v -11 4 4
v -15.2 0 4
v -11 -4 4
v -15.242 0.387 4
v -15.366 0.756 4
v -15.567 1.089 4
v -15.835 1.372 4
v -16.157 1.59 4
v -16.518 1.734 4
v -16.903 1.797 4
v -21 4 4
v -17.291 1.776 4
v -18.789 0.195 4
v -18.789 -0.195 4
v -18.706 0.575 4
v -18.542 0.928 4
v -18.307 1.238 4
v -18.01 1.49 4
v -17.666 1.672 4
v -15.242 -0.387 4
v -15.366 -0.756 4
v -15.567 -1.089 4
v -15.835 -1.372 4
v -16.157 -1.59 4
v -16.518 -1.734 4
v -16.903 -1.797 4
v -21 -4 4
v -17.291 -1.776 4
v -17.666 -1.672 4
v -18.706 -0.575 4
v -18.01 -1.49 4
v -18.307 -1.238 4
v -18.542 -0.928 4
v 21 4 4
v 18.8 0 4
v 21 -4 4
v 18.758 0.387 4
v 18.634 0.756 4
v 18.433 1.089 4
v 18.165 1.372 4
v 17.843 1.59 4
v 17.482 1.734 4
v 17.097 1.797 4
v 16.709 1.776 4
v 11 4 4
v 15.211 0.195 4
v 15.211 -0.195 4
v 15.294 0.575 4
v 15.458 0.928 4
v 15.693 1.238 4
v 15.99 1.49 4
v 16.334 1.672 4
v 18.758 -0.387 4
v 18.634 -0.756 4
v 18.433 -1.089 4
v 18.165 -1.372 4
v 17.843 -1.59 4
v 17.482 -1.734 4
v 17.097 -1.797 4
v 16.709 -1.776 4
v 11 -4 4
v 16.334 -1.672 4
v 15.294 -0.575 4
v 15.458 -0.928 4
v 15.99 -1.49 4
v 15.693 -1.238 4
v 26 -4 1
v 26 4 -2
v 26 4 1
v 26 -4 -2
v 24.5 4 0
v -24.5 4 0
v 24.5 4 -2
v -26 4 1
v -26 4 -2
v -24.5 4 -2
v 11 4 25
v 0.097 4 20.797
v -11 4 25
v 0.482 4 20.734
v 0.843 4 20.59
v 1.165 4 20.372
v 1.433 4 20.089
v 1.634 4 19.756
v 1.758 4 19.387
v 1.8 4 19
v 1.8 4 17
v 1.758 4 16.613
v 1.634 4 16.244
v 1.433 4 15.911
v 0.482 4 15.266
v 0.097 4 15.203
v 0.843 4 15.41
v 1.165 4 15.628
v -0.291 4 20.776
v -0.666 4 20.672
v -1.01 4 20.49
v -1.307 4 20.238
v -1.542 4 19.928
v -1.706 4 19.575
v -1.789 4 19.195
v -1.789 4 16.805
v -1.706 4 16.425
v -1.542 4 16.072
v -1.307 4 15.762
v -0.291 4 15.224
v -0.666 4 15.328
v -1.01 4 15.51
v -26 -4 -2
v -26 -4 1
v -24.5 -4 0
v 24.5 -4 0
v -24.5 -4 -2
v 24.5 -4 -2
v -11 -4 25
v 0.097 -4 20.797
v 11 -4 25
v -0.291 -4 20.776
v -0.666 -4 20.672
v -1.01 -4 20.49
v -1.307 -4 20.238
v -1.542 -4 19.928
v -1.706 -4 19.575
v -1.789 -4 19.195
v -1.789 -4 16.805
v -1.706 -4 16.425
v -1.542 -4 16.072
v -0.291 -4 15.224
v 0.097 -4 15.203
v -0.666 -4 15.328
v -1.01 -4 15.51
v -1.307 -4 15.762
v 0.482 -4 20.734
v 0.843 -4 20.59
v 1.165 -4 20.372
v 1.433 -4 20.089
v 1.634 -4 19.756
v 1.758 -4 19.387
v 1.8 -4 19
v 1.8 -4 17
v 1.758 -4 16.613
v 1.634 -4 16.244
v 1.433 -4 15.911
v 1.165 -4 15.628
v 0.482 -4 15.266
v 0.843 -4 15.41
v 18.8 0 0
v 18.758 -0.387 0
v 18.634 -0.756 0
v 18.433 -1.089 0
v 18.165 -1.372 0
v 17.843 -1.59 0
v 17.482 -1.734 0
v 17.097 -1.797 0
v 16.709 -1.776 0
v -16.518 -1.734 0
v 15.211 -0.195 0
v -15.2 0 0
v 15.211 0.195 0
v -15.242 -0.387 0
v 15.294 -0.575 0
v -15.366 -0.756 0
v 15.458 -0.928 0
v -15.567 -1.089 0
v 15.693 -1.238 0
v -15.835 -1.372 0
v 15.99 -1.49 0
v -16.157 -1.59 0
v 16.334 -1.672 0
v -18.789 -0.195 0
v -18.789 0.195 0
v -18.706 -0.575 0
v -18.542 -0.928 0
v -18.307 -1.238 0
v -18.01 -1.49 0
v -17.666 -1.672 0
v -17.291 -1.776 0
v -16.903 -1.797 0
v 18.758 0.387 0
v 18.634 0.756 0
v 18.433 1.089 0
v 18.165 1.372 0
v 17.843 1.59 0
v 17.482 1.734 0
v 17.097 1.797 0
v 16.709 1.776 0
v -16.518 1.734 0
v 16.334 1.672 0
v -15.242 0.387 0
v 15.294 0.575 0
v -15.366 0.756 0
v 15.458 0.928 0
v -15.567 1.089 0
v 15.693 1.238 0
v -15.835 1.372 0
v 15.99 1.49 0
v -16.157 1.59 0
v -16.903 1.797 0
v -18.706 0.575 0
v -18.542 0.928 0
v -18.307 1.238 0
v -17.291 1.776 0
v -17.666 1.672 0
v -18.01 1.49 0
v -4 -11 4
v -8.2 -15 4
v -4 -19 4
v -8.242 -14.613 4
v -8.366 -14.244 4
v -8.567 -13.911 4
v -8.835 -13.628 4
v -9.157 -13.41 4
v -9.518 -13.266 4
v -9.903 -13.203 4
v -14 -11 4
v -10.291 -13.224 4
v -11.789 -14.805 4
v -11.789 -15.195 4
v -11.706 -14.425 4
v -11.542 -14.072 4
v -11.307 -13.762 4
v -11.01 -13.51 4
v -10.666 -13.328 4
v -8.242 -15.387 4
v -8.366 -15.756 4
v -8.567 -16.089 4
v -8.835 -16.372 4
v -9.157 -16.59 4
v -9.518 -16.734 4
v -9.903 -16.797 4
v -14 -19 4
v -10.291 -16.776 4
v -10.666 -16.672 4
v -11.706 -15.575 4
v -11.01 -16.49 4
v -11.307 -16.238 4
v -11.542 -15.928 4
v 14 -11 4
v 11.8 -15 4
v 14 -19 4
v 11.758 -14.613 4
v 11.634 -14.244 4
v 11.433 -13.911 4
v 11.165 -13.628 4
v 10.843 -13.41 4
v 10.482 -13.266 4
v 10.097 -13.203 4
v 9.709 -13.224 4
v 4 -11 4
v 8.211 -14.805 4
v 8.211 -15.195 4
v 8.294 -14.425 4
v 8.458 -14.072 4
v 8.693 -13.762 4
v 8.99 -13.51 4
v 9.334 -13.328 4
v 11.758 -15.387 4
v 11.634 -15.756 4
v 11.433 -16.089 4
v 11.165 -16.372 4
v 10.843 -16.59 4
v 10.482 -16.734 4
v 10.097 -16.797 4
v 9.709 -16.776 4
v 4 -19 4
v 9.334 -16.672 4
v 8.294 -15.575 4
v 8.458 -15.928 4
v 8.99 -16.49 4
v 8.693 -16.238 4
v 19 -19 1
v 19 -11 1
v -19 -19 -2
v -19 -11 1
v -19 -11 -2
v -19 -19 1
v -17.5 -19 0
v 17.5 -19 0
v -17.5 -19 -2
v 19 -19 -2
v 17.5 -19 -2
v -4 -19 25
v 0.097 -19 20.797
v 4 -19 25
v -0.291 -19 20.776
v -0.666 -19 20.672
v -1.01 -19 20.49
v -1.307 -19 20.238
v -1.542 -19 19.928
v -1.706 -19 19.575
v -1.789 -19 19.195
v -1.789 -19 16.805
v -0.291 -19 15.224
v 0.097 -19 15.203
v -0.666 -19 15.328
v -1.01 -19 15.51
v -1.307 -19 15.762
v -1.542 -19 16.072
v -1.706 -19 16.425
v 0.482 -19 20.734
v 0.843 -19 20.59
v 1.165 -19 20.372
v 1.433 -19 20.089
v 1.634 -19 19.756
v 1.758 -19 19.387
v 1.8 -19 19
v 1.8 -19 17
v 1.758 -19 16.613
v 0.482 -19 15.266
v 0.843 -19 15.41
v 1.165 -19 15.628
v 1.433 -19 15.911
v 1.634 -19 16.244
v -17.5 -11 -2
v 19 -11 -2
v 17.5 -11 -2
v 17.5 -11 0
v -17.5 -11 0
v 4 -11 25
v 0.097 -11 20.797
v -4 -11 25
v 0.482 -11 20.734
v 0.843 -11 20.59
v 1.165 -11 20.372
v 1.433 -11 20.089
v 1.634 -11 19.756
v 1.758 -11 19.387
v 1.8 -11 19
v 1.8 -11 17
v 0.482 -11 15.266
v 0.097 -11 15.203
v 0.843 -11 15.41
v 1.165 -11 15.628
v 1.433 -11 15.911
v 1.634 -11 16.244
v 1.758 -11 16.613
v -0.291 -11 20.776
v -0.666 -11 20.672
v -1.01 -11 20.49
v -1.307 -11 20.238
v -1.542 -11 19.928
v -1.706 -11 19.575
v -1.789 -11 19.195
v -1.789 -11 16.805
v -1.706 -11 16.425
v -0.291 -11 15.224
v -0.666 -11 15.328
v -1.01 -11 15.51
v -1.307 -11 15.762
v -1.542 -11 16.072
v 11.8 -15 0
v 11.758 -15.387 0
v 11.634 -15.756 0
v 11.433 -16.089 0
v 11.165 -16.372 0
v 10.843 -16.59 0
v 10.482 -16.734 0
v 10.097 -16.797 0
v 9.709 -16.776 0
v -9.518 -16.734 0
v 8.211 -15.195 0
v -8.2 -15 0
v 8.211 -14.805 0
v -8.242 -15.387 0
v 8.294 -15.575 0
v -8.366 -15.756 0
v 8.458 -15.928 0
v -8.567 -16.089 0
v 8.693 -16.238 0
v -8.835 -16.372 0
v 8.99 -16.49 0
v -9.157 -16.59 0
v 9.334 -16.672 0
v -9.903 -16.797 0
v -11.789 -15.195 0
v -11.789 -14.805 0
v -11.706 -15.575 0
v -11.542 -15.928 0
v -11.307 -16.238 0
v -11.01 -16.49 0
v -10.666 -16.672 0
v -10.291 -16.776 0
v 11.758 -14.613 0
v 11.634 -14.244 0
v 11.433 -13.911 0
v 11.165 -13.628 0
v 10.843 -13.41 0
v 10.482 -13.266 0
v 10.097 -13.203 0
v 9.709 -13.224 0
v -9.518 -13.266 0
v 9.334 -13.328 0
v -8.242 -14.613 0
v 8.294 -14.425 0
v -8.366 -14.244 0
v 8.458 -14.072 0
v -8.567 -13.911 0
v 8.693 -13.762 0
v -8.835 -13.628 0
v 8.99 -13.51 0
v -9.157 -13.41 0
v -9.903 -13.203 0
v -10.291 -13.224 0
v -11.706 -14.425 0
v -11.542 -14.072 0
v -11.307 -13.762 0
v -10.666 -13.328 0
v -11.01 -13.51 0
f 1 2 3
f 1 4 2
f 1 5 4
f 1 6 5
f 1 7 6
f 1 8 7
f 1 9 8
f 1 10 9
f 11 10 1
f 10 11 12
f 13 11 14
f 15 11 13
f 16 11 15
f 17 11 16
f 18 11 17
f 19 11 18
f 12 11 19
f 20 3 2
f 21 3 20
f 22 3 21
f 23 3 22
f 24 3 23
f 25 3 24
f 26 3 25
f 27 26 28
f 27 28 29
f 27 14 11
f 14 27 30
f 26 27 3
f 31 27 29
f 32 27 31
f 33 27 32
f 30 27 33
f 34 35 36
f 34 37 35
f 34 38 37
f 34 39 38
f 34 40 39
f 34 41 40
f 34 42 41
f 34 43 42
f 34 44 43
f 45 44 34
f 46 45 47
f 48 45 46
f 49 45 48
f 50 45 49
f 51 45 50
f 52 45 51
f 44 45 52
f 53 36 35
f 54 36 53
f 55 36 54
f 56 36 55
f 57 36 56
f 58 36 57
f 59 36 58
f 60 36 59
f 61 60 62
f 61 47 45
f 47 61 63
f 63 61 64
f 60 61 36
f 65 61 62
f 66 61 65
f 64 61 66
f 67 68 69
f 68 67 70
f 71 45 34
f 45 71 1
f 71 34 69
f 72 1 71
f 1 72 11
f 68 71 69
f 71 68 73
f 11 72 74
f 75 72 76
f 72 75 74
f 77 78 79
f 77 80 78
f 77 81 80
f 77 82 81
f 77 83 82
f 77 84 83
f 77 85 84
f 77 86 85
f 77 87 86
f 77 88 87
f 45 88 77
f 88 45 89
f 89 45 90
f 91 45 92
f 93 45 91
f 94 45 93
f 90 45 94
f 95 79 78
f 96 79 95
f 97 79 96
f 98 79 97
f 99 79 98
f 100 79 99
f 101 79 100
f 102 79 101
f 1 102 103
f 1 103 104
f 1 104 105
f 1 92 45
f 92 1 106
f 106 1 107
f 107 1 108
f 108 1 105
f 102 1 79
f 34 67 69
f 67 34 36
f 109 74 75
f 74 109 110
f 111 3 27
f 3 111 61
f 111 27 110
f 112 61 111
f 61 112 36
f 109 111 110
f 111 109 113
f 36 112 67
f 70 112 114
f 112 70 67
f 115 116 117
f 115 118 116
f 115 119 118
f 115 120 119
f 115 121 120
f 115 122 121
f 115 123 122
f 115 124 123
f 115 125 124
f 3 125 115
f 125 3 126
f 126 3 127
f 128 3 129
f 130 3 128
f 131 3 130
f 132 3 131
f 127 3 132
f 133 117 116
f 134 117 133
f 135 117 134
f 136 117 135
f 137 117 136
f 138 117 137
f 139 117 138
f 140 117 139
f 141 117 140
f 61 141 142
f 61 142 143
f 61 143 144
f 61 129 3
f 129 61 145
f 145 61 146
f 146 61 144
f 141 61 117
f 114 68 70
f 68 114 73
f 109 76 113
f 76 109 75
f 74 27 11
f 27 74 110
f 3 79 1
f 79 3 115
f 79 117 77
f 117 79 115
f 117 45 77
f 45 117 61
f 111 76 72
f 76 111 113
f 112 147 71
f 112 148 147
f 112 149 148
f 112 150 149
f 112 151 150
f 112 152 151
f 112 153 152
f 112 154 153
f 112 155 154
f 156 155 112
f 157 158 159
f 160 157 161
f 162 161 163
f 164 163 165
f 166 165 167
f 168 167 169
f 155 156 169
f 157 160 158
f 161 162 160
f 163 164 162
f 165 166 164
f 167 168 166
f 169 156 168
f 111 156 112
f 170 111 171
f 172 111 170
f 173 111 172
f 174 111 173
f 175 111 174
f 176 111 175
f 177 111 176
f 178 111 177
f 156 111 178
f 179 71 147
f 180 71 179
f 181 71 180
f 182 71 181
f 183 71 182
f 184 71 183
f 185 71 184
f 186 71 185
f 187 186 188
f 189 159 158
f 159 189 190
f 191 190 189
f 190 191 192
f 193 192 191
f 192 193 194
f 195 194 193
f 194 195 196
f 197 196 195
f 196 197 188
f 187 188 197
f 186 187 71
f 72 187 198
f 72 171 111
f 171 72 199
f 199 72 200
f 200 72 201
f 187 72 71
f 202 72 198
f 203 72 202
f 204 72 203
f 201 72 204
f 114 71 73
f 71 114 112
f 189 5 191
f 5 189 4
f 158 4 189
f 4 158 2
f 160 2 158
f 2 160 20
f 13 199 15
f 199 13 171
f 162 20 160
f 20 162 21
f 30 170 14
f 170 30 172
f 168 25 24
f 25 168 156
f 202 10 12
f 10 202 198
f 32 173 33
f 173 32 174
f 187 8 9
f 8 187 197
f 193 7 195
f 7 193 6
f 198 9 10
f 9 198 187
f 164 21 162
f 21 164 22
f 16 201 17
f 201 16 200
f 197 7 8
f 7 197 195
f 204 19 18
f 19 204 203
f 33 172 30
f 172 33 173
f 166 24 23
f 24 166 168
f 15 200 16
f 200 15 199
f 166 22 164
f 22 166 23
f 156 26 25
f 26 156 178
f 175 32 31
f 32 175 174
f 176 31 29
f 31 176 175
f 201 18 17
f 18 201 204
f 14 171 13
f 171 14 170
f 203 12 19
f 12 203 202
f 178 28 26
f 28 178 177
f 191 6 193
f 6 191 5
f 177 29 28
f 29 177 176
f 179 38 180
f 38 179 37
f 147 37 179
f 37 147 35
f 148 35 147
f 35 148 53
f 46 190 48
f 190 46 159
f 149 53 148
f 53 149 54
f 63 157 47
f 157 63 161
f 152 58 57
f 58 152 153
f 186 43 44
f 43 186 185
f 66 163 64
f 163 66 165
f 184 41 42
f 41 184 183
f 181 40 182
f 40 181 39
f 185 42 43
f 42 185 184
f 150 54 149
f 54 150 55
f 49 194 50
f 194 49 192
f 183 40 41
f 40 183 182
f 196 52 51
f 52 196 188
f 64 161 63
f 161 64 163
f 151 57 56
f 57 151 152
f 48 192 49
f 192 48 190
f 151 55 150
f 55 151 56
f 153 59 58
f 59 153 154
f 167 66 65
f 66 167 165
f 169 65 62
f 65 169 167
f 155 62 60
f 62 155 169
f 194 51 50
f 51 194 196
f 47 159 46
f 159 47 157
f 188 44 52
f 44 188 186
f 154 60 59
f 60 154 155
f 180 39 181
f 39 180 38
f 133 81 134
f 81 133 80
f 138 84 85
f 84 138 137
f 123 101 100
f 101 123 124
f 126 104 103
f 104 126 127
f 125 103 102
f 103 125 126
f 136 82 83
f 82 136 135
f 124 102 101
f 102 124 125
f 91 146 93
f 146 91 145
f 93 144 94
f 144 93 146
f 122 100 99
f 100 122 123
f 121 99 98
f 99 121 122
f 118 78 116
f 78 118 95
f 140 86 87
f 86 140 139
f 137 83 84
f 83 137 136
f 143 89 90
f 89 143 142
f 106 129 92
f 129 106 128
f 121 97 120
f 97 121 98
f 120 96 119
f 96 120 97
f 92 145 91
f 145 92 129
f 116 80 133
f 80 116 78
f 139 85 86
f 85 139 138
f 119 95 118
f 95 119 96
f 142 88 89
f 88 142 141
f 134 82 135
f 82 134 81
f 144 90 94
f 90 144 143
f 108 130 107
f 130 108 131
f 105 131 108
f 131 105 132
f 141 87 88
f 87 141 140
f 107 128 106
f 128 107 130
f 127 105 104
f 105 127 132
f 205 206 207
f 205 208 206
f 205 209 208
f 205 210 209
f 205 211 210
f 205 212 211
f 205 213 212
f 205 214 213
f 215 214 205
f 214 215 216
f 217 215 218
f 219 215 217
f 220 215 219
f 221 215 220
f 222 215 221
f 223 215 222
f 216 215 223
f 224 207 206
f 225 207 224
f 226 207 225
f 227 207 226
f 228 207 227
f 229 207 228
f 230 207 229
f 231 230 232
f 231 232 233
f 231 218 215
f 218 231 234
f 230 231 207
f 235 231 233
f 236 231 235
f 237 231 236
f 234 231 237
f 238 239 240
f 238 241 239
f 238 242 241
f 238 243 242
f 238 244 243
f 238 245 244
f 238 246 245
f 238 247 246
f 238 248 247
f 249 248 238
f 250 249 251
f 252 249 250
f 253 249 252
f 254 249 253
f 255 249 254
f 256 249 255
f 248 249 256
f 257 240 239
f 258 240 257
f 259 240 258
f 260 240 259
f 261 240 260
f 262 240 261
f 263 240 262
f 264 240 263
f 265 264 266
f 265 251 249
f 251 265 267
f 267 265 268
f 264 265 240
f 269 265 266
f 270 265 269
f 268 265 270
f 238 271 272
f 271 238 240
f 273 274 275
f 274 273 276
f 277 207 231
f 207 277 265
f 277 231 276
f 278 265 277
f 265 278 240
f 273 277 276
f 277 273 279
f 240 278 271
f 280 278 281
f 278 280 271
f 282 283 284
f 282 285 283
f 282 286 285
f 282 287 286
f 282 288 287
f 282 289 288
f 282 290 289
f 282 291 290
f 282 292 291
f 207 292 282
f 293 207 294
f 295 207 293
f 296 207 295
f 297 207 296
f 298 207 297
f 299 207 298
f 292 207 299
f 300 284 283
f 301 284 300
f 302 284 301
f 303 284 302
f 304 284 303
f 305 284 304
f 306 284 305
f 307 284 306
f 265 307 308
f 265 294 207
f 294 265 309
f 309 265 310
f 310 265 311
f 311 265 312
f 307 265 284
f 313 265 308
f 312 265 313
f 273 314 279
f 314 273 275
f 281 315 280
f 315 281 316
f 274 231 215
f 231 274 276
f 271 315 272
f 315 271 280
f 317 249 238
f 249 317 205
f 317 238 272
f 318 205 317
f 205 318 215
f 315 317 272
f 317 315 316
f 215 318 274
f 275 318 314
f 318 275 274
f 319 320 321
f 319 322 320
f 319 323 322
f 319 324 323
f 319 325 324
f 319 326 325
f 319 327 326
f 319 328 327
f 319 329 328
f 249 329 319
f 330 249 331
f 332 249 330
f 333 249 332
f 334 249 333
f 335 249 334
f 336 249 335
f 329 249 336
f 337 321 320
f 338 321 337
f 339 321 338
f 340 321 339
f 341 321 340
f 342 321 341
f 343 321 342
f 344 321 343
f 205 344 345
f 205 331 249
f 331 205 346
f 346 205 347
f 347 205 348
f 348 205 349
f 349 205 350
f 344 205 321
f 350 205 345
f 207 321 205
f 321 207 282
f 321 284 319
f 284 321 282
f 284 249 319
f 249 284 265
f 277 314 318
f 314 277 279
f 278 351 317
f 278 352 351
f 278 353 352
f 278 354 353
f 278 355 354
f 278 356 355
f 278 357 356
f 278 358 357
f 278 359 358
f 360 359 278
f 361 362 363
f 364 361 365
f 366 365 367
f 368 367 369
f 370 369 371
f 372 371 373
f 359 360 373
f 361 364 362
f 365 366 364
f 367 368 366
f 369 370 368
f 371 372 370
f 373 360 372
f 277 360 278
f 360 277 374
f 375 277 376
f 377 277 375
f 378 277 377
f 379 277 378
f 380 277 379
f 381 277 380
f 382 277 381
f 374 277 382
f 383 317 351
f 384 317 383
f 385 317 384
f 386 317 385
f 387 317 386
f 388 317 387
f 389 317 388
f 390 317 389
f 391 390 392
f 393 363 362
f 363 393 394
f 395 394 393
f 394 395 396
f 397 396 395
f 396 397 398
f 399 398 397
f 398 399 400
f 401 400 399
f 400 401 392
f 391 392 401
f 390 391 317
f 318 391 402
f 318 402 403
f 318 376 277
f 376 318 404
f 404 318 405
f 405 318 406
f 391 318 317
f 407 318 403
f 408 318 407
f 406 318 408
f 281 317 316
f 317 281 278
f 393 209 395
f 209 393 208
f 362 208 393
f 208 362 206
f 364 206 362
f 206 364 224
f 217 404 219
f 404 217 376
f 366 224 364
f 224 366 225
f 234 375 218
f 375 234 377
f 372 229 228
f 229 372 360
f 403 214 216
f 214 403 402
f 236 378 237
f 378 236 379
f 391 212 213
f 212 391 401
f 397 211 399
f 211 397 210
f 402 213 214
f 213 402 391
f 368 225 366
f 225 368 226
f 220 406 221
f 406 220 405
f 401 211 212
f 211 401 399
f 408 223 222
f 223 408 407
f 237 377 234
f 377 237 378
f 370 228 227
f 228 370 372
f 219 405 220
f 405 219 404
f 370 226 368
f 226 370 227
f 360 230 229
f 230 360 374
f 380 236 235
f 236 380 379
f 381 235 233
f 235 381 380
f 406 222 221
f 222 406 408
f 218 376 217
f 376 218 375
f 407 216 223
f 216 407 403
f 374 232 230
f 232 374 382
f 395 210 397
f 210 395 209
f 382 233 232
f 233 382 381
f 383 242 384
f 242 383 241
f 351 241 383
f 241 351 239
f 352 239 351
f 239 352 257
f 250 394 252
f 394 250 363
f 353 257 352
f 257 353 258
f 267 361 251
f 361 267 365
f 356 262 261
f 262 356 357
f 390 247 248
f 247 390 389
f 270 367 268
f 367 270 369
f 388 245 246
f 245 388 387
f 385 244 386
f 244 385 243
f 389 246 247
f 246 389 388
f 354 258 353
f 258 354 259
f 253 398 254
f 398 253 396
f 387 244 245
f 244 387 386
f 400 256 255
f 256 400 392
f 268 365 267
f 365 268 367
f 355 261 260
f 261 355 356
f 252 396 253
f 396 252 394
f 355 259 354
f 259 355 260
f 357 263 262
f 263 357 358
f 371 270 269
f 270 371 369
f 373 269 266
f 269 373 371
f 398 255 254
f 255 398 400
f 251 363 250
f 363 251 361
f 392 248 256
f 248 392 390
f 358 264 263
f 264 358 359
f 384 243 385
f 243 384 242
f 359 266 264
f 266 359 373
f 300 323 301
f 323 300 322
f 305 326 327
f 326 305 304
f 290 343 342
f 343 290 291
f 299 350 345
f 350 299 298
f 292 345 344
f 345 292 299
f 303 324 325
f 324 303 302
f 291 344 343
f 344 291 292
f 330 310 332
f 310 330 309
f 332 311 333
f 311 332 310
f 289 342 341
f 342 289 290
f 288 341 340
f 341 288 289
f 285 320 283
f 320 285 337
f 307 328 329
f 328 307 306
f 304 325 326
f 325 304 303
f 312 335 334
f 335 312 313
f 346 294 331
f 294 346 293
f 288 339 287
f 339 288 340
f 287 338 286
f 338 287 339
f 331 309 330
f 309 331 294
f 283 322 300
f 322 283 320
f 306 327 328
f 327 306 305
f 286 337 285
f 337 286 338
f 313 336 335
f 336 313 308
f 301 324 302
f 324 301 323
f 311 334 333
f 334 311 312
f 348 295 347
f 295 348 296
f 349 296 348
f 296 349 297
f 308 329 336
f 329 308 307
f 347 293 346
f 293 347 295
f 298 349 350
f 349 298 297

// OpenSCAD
//$fn=60;
$fa=5;
$fs=.4;

horn();//for X
translate([0,-15]) horn(part_width=34);//for Y


module horn(part_width=48){
    difference(){
        body_all(part_width);
        holes(part_width);
    }
}

module body_all(part_width){
    hull(){
        translate([0,0,-2]) linear_extrude(height=3) square([part_width+4,8],center=true);
        translate([0,0,-2]) linear_extrude(height=6) square([part_width-6,8],center=true);
    }
    linear_extrude(height=25) square([part_width-2*13,8],center=true);
}

module holes(part_width){
    translate([0,0,-3]) linear_extrude(height=3) square([part_width+1,10],center=true);

    translate([-part_width/2+7,0,-1]) linear_extrude(height=10) circle(d=3.6);
    translate([part_width/2-7,0,-1]) linear_extrude(height=10) circle(d=3.6);

    translate([0,0,18]) rotate([90,0,0]) translate([0,0,-5]) linear_extrude(height=10) hull(){
        translate([0,1]) circle(d=3.6);
        translate([0,-1]) circle(d=3.6);
    }
}
